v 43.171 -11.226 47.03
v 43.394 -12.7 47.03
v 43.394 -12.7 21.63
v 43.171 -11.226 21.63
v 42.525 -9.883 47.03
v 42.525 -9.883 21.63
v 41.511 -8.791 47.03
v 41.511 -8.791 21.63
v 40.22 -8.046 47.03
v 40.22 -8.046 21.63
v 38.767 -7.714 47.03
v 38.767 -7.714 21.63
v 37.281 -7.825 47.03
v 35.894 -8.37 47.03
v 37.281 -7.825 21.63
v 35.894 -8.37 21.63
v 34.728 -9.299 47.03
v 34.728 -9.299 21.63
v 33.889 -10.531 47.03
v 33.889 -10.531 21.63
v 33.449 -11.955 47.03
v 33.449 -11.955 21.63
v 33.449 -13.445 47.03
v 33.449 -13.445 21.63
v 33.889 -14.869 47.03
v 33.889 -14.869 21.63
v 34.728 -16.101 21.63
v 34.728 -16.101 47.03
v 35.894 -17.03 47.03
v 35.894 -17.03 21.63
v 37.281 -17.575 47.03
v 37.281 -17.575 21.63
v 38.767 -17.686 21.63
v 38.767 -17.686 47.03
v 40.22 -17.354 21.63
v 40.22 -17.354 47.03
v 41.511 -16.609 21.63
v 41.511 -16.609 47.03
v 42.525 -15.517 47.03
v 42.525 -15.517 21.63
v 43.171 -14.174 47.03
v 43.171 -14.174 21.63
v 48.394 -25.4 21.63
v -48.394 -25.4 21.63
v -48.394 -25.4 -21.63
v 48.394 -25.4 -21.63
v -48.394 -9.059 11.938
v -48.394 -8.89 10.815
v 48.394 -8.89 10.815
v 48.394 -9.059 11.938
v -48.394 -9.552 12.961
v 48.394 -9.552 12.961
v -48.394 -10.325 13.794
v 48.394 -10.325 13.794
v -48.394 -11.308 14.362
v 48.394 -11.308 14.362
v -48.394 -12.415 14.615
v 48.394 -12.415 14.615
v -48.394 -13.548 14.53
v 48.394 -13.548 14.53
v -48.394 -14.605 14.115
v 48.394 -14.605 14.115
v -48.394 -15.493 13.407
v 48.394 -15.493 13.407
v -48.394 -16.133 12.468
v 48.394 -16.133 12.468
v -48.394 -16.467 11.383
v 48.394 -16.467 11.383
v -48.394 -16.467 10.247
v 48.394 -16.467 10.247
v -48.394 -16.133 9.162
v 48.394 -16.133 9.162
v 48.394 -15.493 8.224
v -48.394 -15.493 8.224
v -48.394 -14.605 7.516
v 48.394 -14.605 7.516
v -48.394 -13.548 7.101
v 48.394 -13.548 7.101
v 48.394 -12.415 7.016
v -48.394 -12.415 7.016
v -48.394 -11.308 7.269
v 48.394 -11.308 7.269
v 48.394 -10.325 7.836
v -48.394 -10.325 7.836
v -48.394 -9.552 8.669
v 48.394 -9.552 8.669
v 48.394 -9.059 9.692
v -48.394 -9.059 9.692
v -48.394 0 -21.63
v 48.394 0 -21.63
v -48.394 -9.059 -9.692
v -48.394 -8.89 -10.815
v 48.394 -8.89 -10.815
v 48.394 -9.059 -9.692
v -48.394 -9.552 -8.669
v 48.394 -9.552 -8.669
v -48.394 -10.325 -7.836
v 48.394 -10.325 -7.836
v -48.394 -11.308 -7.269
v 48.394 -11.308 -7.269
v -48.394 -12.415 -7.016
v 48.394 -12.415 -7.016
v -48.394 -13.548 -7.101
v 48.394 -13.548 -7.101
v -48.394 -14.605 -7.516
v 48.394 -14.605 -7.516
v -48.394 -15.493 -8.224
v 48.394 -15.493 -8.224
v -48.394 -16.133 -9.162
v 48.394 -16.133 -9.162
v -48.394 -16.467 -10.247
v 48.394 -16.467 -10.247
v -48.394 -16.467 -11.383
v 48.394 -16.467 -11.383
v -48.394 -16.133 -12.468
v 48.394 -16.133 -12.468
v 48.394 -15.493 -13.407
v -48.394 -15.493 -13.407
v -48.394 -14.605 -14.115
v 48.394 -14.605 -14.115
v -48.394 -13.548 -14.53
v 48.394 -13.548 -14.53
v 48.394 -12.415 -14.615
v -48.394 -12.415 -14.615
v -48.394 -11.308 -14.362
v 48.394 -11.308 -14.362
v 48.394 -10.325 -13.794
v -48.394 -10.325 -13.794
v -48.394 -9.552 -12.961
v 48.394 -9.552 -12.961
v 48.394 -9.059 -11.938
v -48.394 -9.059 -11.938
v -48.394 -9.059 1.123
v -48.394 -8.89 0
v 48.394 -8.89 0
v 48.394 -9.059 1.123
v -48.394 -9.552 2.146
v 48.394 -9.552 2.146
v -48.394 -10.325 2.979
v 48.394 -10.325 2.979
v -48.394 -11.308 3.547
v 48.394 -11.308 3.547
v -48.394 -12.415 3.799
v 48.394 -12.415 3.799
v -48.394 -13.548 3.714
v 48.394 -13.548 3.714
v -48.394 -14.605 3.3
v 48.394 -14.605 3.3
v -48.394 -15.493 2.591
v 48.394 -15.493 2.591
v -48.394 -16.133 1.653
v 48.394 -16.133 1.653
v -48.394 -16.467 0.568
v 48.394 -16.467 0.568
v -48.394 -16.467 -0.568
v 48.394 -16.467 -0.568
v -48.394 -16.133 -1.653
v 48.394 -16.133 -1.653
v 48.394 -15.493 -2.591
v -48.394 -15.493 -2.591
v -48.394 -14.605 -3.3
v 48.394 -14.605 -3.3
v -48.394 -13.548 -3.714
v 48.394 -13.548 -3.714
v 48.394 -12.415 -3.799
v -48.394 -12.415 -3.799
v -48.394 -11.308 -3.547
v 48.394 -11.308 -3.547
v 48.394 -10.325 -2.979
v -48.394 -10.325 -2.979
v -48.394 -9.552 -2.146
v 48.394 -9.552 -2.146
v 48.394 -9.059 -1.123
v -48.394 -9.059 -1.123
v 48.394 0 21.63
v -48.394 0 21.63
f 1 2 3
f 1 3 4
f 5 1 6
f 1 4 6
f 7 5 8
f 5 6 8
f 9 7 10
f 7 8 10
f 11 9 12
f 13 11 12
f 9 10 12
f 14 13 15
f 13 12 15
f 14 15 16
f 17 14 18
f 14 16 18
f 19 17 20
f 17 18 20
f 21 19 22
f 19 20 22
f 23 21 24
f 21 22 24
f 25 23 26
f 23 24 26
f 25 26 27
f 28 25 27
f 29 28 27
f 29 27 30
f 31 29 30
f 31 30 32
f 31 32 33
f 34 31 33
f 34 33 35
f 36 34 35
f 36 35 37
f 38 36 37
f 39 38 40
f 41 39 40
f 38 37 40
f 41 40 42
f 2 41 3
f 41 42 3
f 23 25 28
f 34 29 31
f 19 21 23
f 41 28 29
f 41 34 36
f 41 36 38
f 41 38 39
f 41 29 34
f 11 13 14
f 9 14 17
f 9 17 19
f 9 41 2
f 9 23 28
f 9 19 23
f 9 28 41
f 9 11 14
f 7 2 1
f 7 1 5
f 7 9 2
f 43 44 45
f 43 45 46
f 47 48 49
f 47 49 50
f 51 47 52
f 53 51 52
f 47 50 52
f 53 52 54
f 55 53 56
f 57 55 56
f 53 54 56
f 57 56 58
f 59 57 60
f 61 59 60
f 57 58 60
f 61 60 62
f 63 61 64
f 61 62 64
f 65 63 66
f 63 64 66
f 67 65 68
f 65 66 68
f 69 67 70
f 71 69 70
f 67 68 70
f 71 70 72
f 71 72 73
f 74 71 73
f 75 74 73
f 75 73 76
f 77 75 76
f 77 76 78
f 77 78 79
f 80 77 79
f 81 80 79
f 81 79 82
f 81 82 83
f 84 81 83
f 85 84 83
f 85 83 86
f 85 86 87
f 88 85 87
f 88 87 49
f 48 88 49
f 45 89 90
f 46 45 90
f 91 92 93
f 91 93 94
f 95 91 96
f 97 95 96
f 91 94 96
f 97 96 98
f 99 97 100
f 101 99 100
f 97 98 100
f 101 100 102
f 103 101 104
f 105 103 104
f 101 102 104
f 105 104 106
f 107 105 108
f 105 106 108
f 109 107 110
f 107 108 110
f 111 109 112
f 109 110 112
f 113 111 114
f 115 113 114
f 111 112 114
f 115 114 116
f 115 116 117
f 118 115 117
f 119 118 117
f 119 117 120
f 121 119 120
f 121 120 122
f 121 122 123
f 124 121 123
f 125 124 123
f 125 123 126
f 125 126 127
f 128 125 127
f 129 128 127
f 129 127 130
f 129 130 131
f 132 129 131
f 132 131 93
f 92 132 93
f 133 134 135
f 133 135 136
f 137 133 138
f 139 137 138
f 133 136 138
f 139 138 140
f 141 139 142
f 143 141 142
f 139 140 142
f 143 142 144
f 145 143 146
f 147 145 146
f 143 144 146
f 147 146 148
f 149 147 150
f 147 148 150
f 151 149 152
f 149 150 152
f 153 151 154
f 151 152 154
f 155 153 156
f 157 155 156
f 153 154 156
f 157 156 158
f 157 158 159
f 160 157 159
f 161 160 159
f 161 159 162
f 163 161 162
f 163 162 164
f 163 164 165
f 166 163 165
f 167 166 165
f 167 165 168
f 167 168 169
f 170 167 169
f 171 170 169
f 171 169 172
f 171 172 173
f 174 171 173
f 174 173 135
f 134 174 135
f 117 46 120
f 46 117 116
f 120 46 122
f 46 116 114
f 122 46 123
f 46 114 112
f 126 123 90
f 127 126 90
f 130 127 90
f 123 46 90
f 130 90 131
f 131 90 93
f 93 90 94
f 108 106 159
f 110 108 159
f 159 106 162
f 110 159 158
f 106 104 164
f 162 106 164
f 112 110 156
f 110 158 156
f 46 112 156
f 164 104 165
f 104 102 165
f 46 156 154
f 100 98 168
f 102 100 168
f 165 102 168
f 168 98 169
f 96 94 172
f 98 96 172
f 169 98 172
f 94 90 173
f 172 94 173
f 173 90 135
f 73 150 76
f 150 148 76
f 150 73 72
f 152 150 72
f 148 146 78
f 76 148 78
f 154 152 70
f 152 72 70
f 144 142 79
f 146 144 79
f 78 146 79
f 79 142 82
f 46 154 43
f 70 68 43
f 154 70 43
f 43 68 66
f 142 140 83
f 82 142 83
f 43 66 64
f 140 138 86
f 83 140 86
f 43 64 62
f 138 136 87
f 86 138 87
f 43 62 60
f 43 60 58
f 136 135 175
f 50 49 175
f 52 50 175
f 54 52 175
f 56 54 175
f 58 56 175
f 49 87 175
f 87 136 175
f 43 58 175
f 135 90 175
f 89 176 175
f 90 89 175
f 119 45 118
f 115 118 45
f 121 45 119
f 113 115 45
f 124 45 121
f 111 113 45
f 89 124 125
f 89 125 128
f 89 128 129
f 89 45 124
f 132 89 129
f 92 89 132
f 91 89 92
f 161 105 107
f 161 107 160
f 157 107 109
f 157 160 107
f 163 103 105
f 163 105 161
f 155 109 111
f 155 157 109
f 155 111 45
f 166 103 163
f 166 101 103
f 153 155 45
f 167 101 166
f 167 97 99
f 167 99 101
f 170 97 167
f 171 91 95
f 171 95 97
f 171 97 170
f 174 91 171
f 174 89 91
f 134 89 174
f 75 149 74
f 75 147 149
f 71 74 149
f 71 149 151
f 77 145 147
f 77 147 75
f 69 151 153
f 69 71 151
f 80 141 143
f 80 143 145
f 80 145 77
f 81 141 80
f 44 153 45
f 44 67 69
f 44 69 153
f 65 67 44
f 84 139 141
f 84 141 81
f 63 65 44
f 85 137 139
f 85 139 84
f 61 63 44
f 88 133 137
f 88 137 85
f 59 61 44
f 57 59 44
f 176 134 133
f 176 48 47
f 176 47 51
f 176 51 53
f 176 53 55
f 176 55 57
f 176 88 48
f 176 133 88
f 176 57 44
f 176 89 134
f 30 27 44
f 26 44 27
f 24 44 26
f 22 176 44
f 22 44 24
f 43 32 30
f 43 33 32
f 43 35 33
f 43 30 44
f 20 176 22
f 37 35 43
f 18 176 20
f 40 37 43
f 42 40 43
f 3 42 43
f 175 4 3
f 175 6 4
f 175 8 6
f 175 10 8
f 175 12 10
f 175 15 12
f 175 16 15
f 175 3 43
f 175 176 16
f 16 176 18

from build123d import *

# Parameters (mm, degrees)
F0_W     = 96.787006
F0_H     = 43.260872
F6_DEPTH = 25.4
F1_R     = 5
F2_DEPTH = 25.4
F7_R     = 3.81
F8_DEPTH = 96.788006


with BuildPart() as f6:
    # F0 (on Front) → F6 (new body)
    with BuildSketch(Plane.XZ):
        Rectangle(F0_W, F0_H)
    extrude(amount=F6_DEPTH)

    # F1 (on face) → F2 (join)
    with BuildSketch(Plane.XY.offset(21.630436)):
        with Locations((38.393503, -12.7)):
            Circle(F1_R)
    extrude(amount=F2_DEPTH)

    # F7 (on face) → F8 (cut, through all)
    with BuildSketch(Plane.YZ.offset(48.393503)):
        with Locations((-12.7, 10.815218)):
            Circle(F7_R)
        with Locations((-12.7, 0)):
            Circle(F7_R)
        with Locations((-12.7, -10.815218)):
            Circle(F7_R)
    extrude(amount=-F8_DEPTH, mode=Mode.SUBTRACT)


solid = f6.part
